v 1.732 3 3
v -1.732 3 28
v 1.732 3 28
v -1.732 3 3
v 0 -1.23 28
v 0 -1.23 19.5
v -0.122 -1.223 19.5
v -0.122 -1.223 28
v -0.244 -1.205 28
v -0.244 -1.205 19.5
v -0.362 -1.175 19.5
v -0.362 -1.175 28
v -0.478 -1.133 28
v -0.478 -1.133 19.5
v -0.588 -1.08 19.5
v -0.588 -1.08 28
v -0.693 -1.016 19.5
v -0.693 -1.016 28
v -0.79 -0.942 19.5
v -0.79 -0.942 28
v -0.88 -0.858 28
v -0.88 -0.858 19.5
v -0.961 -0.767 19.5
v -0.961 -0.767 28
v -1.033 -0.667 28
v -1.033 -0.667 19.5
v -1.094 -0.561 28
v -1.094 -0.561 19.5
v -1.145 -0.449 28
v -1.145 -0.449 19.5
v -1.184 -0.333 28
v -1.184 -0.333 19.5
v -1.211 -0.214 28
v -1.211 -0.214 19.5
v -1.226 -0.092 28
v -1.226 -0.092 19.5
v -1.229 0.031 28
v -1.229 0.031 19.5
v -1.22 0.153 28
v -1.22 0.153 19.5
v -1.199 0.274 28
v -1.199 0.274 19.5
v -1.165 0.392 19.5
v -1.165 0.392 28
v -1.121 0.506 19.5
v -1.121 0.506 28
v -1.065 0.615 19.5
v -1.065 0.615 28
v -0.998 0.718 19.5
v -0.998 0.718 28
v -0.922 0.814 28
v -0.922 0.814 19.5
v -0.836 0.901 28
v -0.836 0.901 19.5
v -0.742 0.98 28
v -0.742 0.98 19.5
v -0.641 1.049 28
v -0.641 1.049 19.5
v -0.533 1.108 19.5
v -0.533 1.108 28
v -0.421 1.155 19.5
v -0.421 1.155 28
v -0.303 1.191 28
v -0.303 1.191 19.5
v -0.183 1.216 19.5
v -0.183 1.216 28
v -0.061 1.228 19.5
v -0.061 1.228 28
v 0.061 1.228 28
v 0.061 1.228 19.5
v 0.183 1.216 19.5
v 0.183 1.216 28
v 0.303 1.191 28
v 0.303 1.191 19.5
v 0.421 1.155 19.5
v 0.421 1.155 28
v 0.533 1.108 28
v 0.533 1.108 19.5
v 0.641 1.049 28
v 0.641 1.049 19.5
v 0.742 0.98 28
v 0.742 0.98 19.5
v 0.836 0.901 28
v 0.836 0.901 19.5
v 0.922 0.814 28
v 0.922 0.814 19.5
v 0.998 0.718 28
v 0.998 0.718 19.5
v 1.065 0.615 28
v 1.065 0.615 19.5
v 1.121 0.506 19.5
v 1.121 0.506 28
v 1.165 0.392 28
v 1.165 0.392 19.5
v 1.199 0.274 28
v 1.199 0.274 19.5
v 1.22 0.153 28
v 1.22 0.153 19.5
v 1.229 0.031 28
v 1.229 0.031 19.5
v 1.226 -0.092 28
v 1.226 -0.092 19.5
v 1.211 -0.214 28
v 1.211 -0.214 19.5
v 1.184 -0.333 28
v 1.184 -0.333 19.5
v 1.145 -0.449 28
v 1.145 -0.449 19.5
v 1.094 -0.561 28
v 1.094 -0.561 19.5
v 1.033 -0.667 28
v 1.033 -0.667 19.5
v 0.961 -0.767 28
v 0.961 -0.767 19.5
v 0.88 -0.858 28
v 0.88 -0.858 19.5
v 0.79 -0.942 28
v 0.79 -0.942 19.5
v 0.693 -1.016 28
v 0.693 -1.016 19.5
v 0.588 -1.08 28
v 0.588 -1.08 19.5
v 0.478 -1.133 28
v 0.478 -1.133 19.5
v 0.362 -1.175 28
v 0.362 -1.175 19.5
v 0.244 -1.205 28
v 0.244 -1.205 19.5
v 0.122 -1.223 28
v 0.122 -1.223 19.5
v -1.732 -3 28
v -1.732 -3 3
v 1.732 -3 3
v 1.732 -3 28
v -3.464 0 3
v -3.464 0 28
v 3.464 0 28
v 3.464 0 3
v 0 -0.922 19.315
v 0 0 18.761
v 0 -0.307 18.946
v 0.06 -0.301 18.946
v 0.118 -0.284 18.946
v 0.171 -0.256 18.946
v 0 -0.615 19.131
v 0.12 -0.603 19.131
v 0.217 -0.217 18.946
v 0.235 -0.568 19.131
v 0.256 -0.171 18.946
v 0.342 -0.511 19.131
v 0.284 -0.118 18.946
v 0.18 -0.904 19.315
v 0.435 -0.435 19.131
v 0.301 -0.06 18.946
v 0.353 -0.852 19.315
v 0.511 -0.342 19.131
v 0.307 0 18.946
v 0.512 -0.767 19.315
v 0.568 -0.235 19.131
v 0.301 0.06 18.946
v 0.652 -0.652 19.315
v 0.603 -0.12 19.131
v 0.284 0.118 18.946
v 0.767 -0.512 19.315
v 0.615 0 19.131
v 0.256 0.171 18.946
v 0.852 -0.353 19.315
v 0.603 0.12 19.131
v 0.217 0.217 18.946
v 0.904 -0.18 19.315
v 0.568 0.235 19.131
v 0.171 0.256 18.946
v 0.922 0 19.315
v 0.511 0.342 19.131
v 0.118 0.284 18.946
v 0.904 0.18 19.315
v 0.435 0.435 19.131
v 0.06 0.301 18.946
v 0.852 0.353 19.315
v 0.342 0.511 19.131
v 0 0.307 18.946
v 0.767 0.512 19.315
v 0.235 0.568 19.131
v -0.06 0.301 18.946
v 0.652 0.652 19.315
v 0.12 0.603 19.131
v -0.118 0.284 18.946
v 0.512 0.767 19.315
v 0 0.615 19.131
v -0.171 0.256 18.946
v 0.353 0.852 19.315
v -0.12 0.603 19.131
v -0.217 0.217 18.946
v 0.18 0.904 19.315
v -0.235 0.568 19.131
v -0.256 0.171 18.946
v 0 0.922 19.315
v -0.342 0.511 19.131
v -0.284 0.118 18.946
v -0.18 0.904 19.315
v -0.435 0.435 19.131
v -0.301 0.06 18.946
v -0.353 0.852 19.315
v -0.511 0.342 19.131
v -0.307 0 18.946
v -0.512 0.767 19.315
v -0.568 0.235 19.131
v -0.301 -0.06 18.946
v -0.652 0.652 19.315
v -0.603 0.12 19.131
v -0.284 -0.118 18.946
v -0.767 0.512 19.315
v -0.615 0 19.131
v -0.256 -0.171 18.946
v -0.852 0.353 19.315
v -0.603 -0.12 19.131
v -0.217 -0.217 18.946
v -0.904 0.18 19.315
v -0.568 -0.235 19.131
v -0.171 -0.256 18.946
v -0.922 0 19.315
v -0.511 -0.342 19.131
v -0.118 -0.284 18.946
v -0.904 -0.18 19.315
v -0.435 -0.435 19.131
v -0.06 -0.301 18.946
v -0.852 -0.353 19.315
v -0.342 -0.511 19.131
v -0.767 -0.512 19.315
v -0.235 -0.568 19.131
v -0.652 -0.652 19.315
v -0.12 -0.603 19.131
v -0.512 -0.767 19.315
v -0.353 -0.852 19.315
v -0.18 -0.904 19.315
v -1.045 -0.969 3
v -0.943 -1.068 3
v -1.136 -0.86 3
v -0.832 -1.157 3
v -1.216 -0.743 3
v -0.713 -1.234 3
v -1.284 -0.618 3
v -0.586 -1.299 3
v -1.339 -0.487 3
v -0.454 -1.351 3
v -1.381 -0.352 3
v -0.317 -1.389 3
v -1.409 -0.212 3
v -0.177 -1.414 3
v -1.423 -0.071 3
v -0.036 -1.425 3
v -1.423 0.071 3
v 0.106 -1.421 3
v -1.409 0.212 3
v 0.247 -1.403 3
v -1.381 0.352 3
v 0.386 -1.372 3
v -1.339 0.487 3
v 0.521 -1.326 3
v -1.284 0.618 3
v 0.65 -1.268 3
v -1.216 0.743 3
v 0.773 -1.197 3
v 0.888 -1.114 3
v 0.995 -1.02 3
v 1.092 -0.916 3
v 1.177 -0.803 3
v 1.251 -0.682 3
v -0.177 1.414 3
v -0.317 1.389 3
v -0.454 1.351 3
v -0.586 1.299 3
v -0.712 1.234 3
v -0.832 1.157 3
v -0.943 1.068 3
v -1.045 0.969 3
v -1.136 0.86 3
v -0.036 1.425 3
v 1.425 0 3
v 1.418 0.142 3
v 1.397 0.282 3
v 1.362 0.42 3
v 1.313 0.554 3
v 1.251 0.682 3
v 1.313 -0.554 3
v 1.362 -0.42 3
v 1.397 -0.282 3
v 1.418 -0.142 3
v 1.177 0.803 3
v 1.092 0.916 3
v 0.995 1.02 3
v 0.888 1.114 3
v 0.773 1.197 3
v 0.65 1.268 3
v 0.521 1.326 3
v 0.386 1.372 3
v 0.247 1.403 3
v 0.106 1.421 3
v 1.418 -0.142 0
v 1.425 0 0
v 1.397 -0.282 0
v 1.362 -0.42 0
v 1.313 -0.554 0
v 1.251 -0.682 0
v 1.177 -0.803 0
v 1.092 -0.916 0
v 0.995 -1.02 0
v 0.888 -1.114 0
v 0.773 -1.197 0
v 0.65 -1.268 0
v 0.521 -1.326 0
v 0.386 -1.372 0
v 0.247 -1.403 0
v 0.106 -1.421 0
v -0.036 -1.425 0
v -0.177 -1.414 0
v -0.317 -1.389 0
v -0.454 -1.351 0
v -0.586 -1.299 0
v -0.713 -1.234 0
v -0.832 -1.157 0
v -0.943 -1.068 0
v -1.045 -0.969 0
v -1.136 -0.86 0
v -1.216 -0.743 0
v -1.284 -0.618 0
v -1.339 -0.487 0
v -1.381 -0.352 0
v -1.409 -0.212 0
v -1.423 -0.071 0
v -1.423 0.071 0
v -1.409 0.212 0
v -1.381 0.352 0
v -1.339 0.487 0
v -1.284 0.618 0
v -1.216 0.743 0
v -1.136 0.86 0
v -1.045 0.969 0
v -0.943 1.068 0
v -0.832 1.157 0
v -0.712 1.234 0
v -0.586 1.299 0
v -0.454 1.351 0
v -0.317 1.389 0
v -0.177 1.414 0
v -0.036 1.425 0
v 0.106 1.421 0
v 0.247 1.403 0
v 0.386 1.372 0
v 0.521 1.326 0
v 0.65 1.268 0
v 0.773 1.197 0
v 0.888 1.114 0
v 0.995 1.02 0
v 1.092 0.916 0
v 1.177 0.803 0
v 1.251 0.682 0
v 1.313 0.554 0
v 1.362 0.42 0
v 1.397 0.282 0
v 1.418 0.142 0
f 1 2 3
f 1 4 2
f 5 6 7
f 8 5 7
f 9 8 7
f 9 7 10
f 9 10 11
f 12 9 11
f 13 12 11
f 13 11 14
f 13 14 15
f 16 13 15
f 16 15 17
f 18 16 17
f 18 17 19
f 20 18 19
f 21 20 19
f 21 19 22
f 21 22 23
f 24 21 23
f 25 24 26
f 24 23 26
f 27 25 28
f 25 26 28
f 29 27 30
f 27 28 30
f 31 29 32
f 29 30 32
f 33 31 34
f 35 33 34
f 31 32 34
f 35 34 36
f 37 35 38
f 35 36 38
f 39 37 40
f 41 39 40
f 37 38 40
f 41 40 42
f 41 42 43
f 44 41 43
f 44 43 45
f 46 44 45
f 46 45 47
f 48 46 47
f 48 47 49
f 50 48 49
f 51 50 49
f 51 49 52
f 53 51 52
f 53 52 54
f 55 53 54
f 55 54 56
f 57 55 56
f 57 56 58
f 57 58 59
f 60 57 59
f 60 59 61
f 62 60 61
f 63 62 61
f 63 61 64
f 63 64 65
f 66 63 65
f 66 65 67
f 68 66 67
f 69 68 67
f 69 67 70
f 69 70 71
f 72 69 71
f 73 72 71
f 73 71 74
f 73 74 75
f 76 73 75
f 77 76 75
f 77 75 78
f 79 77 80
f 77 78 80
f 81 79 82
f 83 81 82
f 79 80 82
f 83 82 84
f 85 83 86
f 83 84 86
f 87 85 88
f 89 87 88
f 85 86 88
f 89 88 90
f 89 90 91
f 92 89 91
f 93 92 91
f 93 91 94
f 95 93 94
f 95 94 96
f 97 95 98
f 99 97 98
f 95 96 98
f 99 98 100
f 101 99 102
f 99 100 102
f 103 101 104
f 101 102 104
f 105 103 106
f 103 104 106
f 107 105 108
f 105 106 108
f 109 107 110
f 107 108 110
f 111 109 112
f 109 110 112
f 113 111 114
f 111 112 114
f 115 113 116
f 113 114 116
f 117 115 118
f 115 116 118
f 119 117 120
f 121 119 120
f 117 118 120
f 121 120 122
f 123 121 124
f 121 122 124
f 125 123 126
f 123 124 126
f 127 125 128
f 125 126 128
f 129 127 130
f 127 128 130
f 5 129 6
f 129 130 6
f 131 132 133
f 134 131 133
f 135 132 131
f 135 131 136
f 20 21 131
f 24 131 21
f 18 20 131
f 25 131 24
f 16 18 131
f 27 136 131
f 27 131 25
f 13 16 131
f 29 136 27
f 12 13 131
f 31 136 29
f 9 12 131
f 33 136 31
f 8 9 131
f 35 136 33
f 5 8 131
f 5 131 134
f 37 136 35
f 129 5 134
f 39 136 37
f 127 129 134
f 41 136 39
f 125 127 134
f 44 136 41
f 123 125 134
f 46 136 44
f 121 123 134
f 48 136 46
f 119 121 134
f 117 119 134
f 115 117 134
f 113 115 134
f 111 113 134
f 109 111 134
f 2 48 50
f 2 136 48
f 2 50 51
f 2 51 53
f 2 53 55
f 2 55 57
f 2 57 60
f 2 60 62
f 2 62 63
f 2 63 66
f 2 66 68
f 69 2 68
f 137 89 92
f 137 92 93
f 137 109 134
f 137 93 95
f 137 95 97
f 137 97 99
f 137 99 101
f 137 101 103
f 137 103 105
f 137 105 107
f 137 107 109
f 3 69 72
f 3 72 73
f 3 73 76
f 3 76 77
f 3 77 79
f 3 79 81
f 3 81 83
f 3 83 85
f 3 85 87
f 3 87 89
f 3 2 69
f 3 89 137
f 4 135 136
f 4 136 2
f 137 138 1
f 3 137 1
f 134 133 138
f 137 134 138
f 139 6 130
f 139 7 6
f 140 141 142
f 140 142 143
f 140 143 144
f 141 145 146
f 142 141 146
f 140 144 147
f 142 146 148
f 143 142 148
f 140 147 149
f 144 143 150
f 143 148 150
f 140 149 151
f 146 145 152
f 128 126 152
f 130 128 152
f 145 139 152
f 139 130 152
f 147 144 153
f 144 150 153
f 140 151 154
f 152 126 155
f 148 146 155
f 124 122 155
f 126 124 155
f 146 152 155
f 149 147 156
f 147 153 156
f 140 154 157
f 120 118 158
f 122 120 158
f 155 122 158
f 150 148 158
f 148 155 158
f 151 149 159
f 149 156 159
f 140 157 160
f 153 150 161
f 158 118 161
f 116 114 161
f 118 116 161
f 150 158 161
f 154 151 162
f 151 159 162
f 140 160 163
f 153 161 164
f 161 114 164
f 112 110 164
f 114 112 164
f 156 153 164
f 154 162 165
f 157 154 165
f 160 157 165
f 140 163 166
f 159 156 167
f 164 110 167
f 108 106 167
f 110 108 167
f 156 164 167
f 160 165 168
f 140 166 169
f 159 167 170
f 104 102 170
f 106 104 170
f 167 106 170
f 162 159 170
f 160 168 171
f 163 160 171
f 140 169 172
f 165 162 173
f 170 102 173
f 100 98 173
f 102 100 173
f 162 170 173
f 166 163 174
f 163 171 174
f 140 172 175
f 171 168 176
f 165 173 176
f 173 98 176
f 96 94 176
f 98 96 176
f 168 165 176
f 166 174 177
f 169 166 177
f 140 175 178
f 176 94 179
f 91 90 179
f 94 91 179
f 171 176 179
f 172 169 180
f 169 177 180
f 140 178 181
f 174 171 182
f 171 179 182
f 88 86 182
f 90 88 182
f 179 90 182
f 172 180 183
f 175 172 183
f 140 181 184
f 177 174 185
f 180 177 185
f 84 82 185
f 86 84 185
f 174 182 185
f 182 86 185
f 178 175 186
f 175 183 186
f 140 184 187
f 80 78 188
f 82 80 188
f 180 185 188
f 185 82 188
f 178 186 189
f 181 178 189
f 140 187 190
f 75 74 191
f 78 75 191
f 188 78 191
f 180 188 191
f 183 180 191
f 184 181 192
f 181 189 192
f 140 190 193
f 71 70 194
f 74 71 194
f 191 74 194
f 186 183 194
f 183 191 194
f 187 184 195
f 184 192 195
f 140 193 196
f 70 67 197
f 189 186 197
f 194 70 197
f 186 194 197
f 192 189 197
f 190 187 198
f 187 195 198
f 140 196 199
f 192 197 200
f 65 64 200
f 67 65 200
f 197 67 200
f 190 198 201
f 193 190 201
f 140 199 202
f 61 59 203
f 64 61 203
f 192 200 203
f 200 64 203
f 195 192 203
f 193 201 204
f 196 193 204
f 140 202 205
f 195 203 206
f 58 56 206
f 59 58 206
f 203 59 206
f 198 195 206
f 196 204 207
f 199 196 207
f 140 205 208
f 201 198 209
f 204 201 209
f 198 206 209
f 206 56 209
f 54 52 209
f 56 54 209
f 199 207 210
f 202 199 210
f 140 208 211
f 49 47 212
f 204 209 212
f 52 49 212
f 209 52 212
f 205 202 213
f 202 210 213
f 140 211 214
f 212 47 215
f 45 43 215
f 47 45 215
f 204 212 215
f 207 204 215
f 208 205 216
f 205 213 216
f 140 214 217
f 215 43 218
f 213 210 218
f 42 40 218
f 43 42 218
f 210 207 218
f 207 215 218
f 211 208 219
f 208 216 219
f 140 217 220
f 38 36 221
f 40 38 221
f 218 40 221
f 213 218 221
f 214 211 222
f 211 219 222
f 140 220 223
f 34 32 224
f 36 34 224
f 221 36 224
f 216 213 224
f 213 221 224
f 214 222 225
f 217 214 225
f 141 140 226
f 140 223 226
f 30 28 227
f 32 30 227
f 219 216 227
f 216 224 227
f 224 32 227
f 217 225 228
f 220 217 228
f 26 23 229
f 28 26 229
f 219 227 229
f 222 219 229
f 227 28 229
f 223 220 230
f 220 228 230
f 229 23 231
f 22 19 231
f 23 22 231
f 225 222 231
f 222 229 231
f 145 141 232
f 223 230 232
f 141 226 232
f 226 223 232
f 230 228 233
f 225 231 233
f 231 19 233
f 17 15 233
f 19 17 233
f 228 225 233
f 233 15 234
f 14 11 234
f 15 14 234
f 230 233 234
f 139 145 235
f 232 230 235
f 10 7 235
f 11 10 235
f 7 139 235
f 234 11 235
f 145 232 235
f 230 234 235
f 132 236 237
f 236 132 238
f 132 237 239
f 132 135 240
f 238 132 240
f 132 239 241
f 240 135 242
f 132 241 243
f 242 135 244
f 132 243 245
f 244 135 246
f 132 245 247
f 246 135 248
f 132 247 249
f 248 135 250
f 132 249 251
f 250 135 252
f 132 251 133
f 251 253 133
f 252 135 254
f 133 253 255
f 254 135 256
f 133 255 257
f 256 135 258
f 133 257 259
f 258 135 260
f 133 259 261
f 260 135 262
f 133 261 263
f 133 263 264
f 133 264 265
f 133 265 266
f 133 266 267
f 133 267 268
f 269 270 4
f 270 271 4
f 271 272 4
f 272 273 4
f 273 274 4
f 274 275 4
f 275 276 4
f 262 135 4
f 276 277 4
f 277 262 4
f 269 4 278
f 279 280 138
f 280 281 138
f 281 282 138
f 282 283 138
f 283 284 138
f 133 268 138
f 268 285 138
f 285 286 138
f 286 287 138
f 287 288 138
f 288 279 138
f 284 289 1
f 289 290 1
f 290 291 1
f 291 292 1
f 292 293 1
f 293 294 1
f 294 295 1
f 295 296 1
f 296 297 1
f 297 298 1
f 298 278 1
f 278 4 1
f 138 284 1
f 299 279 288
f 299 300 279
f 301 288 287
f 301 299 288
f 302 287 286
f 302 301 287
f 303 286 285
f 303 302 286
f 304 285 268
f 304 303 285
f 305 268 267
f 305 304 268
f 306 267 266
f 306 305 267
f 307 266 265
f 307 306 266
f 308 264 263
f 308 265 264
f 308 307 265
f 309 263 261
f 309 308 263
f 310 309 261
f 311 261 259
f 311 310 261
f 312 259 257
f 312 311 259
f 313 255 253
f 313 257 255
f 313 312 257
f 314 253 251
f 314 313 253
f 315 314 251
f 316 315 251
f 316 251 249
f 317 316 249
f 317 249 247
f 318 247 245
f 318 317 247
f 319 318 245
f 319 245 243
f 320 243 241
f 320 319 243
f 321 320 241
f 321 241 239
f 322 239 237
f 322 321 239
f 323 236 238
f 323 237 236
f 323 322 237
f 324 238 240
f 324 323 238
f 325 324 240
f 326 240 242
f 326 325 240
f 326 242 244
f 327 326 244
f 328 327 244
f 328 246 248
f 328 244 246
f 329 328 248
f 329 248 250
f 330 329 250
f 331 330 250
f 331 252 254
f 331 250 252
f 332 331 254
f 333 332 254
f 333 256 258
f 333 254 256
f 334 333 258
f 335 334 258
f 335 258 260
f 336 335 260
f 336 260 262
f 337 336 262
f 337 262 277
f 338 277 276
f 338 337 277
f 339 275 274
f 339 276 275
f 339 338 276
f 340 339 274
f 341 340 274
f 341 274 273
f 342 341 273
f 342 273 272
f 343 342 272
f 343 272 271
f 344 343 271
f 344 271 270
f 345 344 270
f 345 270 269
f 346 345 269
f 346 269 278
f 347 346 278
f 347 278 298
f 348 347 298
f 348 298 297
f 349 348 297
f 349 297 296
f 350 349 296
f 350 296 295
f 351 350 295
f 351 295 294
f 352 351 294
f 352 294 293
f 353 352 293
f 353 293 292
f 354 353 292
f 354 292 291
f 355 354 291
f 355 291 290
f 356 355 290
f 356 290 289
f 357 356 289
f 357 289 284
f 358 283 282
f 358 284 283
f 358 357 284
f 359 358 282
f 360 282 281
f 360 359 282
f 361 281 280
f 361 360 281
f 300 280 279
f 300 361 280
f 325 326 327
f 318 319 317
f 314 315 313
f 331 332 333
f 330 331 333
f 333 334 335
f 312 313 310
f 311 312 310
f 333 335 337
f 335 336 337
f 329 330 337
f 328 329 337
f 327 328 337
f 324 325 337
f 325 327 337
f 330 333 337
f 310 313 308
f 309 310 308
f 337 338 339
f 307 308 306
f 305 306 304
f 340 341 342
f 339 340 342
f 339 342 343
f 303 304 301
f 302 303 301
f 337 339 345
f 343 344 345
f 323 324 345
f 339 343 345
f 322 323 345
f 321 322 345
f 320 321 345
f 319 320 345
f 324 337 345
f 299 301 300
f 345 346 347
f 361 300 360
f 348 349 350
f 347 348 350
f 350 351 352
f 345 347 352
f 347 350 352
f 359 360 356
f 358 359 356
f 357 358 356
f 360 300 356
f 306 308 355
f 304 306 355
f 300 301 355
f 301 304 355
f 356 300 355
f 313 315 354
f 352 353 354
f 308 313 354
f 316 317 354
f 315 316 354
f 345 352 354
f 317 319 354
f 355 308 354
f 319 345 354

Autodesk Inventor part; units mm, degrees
ref_plane "Plan YZ" through (0, 0, 0) normal (1, 0, 0) x (0, 1, 0)
ref_plane "Plan XZ" through (0, 0, 0) normal (0, 1, 0) x (-1, 0, 0)
ref_plane "Plan XY" through (0, 0, 0) normal (0, 0, 1) x (1, 0, 0)
sketch "Esquisse1" plane through (0, 0, 0) normal (0, 0, 1) x (1, 0, 0)
  circle A0 centre (0, 0) radius 1.425
  dimension "d0" = 2.85
extrude "Extrusion1" add sketch "Esquisse1" along normal blind 3
sketch "Esquisse6" plane through (0, 0, 3) normal (0, 0, 1) x (1, 0, 0)
  line L0 (-4.8497, 0) -> (4.8497, 0) construction
  line L1 (0, -4.2) -> (0, 4.2) construction
  line L2 (-1.7321, -3) -> (-3.4641, 0)
  line L3 (-3.4641, 0) -> (-1.7321, 3)
  line L4 (-1.7321, 3) -> (0, 3)
  line L5 (-1.7321, -3) -> (0, -3)
  line L6 (1.7321, -3) -> (3.4641, 0)
  line L7 (3.4641, 0) -> (1.7321, 3)
  line L8 (1.7321, 3) -> (0, 3)
  line L9 (1.7321, -3) -> (0, -3)
  point P0 (0, 0)
  dimension "d4" = 6
  dimension "d8" = 120
  dimension "d10" = 6
extrude "Extrusion2" add sketch "Esquisse6" along normal blind 25
sketch "Esquisse7" plane through (0, 0, 28) normal (0, 0, 1) x (1, 0, 0)
  circle A0 centre (0, 0) radius 1.425 projected
hole "Perçage1" at (0, 0, 28) direction (0, 0, -1) diameter 2.459 depth 8.5 tip angle 118 thread size "M3x0.5" class "6H" standard "ISO M"
thread "Filetage1" size "M3x0.5" class "6g" standard "ISO M" full length
properties part number "entretoise25" material "."
